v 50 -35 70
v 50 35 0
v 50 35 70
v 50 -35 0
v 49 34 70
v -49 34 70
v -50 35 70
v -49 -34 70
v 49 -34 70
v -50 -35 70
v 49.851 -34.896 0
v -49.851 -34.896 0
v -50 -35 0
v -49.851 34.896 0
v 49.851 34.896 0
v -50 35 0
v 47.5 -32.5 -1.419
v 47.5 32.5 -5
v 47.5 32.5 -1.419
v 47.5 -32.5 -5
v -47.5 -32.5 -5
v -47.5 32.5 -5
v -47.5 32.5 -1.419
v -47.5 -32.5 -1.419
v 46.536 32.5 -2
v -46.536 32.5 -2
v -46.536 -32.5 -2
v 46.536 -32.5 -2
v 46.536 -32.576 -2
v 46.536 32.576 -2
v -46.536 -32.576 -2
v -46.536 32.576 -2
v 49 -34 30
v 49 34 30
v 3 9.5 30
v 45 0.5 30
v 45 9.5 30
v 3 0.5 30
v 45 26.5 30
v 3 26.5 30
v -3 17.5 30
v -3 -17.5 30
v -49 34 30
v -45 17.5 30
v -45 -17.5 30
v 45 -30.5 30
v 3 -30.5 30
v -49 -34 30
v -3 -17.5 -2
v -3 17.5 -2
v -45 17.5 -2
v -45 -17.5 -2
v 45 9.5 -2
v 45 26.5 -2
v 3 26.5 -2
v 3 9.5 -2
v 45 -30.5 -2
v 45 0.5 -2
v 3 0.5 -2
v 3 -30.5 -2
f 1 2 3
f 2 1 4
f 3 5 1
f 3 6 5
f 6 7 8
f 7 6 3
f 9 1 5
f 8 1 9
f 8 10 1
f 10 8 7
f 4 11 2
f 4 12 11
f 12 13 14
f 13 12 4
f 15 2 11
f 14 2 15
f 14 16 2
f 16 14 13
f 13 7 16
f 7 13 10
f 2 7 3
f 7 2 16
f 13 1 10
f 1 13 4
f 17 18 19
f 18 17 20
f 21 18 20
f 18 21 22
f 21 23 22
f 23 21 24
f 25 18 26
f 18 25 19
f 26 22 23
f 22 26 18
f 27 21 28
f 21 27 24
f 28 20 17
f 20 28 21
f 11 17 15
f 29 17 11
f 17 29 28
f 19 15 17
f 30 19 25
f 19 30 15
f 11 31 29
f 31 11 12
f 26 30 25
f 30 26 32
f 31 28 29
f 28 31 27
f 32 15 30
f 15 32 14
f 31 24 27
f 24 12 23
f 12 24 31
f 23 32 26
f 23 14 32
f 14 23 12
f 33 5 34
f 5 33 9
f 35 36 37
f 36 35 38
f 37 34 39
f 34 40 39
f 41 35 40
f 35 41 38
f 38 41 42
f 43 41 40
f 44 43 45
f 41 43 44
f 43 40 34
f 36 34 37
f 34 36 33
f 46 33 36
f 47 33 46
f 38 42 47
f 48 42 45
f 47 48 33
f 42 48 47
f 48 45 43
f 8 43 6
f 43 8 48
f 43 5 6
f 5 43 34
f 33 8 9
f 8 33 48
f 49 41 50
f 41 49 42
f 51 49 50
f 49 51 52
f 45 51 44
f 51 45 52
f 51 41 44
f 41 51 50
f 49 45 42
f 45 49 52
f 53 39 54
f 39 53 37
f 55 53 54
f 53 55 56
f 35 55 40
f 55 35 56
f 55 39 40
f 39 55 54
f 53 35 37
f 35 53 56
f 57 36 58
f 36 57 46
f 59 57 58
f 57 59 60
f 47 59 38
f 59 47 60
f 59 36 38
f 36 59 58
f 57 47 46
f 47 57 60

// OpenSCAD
H=70;               // Height of main box
H2=5;               // Height of bottom centering
SIDE1=100;          // Side of box
SIDE2=70;           // Side of box
D=2;                // Wall-thickness of box
D2=2.5;             // Setback of centering
HI=40;              // Inner Cut-Out

difference() {
    union() {
        translate([0,0,H/2]) cube([SIDE1,SIDE2,H], center=true );                                     // Main Box 100x100x40
        translate([0,0,-H2/2]) cube([SIDE1-2*D2,SIDE2-2*D2,H2],center=true);                          // Bottom
        scale([1,0.7,1]) translate([0,0,-2]) rotate([0,0,45]) cylinder(h=2,d1=1.95*(SIDE2-D2),d2=1.41*SIDE1,$fn=4);    // Chamfer
    }
    translate([0,0, 2*H-HI]) cube([SIDE1-D,SIDE2-D,2*H],center=true);                                  // Inner Cut-Out
    
    translate([-24,  0, 30]) cube([42,35,64], center=true); // Rect-Tokens: Items
    translate([ 24, 18, 30]) cube([42,17,64], center=true); // Rect-Tokens: Specials
    translate([ 24,-15, 30]) cube([42,31,64], center=true); // Rect-Tokens: Spells

//    translate([  0,-100,0]) cube([300,200,300],center=true); // Tester
   
}
